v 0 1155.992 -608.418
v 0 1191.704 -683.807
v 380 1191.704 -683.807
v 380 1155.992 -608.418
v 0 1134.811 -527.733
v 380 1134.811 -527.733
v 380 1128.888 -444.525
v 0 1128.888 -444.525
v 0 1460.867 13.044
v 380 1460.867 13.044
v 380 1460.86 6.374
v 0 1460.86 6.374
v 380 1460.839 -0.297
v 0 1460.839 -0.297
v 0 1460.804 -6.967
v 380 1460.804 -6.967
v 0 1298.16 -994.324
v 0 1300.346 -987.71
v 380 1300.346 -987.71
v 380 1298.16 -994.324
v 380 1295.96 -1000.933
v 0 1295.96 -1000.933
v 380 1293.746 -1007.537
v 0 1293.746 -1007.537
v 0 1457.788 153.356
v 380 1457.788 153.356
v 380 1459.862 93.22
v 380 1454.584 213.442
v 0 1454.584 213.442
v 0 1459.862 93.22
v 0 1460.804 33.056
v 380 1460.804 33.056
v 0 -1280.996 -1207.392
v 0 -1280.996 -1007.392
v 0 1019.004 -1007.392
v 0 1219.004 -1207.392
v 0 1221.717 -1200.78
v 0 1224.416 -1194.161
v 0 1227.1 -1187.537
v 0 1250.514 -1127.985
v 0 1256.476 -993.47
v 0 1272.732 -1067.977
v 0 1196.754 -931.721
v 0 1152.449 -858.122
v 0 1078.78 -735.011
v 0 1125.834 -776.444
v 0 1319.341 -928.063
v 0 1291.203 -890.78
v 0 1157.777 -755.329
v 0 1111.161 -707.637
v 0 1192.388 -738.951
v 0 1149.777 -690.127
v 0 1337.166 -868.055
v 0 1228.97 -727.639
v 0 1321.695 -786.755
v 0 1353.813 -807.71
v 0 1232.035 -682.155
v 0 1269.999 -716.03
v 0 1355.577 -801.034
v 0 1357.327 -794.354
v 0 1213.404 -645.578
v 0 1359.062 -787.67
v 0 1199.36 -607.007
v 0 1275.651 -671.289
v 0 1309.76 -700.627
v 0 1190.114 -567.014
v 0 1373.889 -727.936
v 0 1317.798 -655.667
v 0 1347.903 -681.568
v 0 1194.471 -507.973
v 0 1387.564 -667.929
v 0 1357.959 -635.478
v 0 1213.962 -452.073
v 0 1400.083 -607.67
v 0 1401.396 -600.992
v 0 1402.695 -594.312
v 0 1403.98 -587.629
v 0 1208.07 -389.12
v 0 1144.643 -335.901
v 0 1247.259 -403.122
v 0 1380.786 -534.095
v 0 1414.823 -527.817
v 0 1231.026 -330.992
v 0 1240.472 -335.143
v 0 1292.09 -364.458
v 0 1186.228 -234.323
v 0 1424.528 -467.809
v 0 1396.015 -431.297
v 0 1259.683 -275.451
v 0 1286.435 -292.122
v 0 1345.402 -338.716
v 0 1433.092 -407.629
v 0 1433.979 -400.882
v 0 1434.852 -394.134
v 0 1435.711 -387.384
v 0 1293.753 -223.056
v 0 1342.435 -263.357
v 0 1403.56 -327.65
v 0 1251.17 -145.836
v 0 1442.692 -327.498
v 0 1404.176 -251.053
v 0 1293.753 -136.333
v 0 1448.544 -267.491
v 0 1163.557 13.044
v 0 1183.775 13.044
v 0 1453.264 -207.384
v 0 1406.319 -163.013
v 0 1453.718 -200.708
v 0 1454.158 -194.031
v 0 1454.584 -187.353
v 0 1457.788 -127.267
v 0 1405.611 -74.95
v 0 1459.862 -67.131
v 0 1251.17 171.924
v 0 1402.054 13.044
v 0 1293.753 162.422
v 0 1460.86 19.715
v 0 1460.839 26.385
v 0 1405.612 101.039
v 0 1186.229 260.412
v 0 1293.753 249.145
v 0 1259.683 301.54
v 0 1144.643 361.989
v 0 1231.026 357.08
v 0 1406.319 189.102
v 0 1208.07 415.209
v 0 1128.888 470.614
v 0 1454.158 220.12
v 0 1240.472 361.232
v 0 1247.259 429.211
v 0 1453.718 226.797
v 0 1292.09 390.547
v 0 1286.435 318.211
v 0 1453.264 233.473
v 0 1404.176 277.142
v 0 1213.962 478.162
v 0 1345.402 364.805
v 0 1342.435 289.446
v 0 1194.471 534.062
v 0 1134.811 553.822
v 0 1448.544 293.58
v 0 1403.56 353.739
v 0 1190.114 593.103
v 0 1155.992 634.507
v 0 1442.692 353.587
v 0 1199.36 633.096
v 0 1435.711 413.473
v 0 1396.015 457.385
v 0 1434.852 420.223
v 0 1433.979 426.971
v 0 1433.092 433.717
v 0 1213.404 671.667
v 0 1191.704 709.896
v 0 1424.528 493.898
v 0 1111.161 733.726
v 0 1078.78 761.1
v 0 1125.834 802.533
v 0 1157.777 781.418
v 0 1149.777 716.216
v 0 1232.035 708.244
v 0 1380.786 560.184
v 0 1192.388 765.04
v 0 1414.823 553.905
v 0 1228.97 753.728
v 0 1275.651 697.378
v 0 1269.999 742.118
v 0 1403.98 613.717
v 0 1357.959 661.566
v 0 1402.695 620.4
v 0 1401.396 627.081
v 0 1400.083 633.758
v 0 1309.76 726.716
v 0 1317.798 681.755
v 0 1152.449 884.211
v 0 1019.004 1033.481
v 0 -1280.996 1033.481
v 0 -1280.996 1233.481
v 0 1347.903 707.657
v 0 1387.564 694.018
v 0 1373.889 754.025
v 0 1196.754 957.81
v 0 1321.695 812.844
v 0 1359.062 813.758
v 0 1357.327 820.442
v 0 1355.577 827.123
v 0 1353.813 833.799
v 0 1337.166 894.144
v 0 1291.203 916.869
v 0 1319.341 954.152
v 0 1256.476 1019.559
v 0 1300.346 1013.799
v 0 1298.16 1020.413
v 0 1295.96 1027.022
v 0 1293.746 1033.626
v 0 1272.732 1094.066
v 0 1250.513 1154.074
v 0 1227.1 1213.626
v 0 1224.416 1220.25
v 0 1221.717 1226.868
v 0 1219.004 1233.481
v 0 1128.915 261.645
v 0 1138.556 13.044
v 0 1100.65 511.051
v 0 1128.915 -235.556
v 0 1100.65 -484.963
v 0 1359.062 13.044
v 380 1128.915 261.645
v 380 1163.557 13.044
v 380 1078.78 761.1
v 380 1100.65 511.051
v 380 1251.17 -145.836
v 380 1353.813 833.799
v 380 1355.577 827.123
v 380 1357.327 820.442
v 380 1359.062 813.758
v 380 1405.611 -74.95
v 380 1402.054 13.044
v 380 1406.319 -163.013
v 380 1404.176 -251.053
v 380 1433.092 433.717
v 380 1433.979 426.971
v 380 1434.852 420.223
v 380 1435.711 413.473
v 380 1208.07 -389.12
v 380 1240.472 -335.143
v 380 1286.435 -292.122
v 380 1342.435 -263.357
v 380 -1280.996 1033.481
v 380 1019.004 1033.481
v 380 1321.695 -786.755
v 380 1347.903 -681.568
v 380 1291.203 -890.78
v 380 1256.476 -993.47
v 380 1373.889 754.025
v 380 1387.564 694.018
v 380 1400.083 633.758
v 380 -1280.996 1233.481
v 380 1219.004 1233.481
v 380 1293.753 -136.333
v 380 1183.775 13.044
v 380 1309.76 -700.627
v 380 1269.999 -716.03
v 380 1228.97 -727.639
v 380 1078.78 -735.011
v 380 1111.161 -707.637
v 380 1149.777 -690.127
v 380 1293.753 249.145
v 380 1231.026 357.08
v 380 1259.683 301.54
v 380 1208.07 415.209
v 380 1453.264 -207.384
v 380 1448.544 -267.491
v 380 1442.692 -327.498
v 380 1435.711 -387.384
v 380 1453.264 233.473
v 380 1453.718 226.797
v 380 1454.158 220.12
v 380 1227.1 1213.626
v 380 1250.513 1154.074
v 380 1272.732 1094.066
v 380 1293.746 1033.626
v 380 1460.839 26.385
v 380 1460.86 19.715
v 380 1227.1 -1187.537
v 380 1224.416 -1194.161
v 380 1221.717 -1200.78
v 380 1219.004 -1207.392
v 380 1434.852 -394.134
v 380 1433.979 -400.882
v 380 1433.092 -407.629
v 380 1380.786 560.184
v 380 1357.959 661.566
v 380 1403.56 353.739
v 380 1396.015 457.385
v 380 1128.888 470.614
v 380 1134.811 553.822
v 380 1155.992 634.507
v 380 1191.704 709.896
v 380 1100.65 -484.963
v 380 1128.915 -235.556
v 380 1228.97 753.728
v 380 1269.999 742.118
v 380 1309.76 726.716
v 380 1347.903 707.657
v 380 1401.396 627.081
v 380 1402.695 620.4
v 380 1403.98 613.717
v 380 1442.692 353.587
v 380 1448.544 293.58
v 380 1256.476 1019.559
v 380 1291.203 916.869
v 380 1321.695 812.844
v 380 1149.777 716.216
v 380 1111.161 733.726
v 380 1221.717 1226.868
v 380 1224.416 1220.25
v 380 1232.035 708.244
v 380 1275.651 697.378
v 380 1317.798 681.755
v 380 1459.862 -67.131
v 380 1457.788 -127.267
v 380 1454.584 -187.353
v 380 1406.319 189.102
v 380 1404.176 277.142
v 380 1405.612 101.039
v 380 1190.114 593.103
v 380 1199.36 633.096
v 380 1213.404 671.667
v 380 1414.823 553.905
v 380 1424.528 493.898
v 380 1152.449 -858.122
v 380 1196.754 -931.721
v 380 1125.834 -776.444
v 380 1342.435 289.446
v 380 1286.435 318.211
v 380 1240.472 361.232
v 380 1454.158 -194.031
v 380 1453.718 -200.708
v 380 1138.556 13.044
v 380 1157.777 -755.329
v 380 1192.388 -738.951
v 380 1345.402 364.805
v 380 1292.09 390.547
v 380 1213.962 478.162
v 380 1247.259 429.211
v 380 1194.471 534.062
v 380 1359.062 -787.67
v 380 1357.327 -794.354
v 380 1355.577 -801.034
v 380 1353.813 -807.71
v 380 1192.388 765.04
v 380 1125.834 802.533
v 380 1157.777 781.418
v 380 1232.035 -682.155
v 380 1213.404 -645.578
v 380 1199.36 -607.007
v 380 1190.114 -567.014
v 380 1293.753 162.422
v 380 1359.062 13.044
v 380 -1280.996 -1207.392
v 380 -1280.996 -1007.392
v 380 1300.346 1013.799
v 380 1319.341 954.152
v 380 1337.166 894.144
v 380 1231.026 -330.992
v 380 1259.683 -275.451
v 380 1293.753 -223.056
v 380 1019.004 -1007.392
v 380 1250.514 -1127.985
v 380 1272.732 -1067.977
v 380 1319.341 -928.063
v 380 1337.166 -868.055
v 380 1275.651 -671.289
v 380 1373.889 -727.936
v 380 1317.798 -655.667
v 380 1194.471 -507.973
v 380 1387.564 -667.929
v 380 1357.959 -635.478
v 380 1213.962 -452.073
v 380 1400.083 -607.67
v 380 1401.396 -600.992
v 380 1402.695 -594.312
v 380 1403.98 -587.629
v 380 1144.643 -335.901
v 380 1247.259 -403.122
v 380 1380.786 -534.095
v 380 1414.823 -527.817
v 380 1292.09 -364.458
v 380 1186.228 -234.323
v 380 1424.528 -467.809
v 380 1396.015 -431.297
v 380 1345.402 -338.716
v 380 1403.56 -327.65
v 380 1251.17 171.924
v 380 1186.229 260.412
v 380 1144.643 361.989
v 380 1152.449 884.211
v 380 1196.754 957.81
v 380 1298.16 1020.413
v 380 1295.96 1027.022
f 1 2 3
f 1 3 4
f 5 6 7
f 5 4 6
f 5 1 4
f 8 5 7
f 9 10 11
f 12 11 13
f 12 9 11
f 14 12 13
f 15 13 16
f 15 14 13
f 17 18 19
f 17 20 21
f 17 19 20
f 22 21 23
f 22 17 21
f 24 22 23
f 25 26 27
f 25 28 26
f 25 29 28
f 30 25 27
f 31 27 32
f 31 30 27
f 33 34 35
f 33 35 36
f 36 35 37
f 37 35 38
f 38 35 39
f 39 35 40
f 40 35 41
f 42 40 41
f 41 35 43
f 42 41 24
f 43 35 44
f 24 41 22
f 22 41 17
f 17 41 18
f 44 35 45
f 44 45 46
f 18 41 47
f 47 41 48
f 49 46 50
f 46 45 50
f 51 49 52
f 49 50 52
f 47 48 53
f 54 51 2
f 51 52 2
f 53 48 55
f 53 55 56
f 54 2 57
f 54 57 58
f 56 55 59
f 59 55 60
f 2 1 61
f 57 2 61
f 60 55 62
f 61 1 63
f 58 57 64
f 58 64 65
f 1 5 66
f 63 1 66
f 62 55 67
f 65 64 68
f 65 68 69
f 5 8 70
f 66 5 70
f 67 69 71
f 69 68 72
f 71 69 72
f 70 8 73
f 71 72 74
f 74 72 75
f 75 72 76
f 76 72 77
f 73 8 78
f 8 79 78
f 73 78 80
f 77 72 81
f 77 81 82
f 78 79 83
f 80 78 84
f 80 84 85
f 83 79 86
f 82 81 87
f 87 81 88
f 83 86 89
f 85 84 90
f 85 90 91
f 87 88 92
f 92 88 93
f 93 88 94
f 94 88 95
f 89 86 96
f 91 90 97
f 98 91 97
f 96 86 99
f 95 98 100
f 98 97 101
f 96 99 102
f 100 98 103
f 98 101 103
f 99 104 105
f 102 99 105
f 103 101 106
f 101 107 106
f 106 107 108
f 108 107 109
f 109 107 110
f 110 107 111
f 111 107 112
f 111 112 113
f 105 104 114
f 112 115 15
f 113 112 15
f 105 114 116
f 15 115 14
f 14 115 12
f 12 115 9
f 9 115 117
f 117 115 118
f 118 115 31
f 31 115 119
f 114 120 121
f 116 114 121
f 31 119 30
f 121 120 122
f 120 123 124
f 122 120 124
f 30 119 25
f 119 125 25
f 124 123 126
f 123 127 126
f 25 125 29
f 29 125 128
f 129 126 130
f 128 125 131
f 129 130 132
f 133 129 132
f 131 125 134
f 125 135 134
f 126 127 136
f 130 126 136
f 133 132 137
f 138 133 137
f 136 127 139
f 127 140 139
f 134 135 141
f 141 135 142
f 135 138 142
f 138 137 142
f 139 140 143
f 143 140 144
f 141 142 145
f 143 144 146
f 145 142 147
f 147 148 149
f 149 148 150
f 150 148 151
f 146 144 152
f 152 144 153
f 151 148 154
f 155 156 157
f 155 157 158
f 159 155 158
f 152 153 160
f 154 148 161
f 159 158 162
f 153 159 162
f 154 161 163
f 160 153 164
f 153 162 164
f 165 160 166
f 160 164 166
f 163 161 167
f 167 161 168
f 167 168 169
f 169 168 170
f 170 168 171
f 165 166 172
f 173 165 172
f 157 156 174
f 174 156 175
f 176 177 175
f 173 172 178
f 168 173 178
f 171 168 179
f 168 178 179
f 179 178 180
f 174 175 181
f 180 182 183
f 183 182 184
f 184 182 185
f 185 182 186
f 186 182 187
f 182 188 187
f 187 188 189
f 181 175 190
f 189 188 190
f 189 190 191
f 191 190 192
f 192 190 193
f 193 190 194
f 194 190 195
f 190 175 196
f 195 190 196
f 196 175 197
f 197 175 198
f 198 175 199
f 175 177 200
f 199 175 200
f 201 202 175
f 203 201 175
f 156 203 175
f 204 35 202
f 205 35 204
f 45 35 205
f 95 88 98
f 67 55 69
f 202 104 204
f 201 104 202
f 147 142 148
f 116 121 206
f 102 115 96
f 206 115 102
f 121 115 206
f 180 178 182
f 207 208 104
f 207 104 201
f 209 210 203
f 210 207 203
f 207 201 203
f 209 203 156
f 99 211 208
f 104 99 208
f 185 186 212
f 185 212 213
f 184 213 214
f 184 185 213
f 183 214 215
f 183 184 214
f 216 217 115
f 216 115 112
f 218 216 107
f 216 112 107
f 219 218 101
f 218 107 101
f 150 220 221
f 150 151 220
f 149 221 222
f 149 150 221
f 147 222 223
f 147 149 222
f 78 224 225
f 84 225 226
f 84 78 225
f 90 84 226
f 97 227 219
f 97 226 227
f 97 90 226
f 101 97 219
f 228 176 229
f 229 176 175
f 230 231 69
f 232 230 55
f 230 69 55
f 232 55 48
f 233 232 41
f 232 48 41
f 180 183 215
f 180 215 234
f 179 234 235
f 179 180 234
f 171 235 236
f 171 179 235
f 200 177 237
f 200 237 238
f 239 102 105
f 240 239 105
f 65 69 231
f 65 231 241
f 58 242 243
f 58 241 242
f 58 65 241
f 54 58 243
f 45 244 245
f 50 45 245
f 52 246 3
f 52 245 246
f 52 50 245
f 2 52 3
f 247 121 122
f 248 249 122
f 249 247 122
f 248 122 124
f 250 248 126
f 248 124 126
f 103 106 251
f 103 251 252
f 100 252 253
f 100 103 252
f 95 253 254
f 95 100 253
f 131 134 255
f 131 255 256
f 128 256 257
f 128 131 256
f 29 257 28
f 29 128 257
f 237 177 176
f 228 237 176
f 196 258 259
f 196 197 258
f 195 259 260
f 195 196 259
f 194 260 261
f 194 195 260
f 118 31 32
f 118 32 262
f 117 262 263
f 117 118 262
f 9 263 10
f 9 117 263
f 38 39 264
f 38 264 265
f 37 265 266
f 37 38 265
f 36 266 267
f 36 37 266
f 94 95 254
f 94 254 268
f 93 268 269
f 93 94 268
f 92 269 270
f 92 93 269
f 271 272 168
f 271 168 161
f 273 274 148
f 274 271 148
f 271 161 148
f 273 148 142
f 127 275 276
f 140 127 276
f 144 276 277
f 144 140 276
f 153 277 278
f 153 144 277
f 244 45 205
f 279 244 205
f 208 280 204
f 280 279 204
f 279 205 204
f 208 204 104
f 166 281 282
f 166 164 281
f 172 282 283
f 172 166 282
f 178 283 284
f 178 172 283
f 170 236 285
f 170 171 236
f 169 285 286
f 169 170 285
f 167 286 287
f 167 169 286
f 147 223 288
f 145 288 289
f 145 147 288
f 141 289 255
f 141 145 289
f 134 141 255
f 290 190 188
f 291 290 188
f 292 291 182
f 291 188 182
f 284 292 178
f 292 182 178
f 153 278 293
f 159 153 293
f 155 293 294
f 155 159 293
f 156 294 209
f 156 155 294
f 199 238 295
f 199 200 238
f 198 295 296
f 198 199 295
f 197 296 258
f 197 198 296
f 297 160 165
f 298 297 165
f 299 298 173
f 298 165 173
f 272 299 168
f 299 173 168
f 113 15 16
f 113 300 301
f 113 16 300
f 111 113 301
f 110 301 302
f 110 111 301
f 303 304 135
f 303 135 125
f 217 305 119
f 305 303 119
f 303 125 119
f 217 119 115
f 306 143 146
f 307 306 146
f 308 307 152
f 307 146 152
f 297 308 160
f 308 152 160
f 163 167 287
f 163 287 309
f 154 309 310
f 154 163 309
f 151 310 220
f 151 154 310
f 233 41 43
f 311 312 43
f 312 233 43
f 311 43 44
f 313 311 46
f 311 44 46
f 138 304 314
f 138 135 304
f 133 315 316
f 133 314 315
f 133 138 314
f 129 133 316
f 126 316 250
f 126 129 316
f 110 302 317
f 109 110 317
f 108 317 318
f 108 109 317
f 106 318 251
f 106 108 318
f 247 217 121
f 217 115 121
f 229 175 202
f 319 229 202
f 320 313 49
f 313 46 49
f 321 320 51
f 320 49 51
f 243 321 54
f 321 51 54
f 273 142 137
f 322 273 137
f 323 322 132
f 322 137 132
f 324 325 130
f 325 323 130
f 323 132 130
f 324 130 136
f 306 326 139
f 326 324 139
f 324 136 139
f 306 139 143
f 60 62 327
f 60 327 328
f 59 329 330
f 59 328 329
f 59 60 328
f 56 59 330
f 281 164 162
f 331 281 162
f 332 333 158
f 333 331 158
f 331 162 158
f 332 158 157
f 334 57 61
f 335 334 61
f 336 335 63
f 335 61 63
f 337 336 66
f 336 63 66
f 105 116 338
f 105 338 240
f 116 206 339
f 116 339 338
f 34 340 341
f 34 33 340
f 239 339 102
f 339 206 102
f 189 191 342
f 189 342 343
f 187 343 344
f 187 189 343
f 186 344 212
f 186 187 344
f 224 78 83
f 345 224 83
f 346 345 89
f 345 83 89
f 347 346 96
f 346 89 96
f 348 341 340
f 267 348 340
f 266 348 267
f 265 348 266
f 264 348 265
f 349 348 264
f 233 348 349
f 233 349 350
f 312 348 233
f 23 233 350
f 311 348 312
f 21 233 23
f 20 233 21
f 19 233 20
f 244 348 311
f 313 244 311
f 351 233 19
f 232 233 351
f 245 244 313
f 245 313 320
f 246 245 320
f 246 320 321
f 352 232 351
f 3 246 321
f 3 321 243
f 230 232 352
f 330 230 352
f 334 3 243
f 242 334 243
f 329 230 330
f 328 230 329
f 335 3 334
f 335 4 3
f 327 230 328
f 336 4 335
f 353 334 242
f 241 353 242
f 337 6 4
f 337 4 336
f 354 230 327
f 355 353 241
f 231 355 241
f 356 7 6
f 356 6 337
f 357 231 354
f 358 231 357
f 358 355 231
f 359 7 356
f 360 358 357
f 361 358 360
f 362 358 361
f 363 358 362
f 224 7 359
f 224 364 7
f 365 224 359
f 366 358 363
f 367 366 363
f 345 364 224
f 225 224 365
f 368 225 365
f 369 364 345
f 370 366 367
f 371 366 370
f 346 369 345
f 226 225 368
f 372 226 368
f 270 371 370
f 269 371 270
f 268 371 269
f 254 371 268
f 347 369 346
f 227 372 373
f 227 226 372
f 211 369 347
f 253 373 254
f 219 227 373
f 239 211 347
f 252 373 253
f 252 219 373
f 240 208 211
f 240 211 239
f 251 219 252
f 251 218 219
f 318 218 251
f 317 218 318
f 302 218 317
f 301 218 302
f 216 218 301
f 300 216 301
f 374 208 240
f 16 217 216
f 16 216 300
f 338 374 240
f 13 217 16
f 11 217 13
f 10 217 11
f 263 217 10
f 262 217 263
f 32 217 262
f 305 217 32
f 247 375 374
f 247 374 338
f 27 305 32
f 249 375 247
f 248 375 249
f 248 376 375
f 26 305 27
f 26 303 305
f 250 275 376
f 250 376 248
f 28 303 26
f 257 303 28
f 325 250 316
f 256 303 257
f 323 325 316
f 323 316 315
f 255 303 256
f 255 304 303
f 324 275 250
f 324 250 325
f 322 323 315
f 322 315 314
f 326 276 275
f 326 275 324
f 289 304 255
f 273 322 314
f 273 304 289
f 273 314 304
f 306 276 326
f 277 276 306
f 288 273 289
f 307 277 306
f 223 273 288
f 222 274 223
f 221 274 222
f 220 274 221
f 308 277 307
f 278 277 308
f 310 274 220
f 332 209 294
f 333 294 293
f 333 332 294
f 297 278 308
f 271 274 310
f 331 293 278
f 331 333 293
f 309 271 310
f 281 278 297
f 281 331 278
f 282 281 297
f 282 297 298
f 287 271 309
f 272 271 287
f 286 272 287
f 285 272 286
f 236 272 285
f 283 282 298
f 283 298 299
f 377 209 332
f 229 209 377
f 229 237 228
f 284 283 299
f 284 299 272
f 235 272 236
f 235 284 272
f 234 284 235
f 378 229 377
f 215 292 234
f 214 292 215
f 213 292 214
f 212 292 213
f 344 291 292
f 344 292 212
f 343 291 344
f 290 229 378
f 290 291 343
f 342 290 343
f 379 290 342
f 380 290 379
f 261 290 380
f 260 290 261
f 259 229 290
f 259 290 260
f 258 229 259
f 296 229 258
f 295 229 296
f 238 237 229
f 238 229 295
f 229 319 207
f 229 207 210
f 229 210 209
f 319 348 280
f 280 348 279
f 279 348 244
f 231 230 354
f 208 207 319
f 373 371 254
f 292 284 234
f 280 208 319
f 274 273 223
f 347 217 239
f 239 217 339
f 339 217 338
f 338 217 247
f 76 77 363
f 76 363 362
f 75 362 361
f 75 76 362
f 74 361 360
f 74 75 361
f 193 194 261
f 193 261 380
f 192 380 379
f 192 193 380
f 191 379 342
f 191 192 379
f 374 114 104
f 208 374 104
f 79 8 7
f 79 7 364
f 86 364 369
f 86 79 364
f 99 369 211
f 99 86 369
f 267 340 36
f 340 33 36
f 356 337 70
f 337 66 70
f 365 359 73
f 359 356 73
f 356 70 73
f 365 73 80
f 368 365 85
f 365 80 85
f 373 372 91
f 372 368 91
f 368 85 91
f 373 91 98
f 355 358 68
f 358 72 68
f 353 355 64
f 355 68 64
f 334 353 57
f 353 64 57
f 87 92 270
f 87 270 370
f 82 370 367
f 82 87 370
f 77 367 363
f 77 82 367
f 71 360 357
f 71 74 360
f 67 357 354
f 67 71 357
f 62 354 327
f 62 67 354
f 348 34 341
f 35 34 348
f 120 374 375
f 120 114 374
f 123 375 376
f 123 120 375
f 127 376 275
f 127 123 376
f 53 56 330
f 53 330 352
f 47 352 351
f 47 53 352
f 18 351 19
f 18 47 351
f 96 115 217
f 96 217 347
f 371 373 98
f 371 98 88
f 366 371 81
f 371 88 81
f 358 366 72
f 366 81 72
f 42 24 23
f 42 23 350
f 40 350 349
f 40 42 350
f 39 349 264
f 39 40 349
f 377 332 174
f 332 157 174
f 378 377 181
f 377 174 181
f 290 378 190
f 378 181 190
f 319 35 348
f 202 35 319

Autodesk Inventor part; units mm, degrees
ref_plane "YZ Plane" through (0, 0, 0) normal (1, 0, 0) x (0, 1, 0)
ref_plane "XZ Plane" through (0, 0, 0) normal (0, 1, 0) x (-1, 0, 0)
ref_plane "XY Plane" through (0, 0, 0) normal (0, 0, 1) x (1, 0, 0)
sketch "Sketch1" plane through (0, 0, 0) normal (1, 0, 0) x (0, 1, 0)
  arc A0 (1227.0996, 1213.6257) -> (1219.0039, 1233.4807) centre (-1740.0857, 15.3721) ccw
  arc A1 (1293.746, 1033.6257) -> (1227.0996, 1213.6257) centre (-1739.133, 13.0159) ccw
  arc A2 (1300.346, 1013.7992) -> (1293.746, 1033.6257) centre (-1739.133, 13.0159) ccw
  arc A3 (1353.8129, 833.7992) -> (1300.346, 1013.7992) centre (-1739.133, 13.0159) ccw
  arc A4 (1359.0618, 813.7583) -> (1353.8129, 833.7992) centre (-1739.133, 13.0159) ccw
  arc A5 (1400.0832, 633.7583) -> (1359.0618, 813.7583) centre (-1739.133, 13.0159) ccw
  arc A6 (1403.9797, 613.7174) -> (1400.0832, 633.7583) centre (-1739.133, 13.0159) ccw
  arc A7 (1433.0918, 433.7174) -> (1403.9797, 613.7174) centre (-1739.133, 13.0159) ccw
  arc A8 (1453.264, 233.4731) -> (1435.7109, 413.4731) centre (-1739.133, 13.0159) ccw
  arc A9 (1435.7109, 413.4731) -> (1433.0918, 433.7174) centre (-1739.133, 13.0159) ccw
  arc A10 (1454.5841, 213.442) -> (1453.264, 233.4731) centre (-1739.133, 13.0159) ccw
  arc A11 (1460.8042, 33.0557) -> (1454.5841, 213.442) centre (-1739.133, 13.0159) ccw
  arc A12 (1460.867, 13.0444) -> (1460.8042, 33.0557) centre (-1739.133, 13.0159) ccw
  line L0 (-1280.9961, 1233.4807) -> (1219.0039, 1233.4807)
  line L1 (-1280.9961, 1233.4807) -> (-1280.9961, 1033.4807)
  line L2 (-1280.9961, 1033.4807) -> (1019.0039, 1033.4807)
  line L3 (1019.0039, 1033.4807) -> (1138.5556, 13.0444)
  line L4 (1460.867, 13.0444) -> (1469.3401, 13.0444)
  line L5 (1402.0541, 13.0444) -> (1293.7527, 249.1451)
  line L6 (1293.7527, 249.1451) -> (1163.5573, 13.0444)
  arc A13 (1208.0697, 415.2091) -> (1293.7527, 249.1451) centre (1799.1105, 615.028) ccw
  arc A14 (1232.0349, 708.2436) -> (1190.1135, 593.1028) centre (1522.2816, 537.3662) ccw
  arc A15 (1128.8881, 470.6135) -> (1251.1701, 171.9244) centre (1578.7407, 480.4058) ccw
  arc A16 (1191.7037, 709.8957) -> (1128.8881, 470.6135) centre (1578.7407, 480.4058) ccw
  arc A17 (1042.3948, 833.8278) -> (1191.7037, 709.8957) centre (1193.4877, 863.9522) ccw
  arc A18 (1400.0832, 633.7583) -> (1232.0349, 708.2436) centre (1155.9138, 309.6924) ccw
  arc A19 (1390.4476, 680.6424) -> (1228.9697, 753.7281) centre (1125.8269, 310.9107) ccw
  arc A20 (1190.1135, 593.1028) -> (1442.5544, 354.8708) centre (1416.5041, 580.1314) ccw
  arc A21 (1208.0697, 415.2091) -> (1449.7856, 279.0945) centre (1417.3067, 504.0976) ccw
  arc A22 (1290.1375, 1044.287) -> (1125.8335, 802.5328) centre (1497.6402, 726.5511) ccw
  arc A23 (1260.8526, 1126.6075) -> (1078.7798, 848.8845) centre (1573.2668, 723.2474) ccw
  arc A24 (1028.8129, 949.7563) -> (1078.7798, 848.8845) centre (1290.1521, 1016.3994) ccw
  arc A25 (1125.8335, 802.5328) -> (1228.9697, 753.7281) centre (1290.1521, 1016.3994) ccw
  line L7 (1359.0618, 13.0444) -> (1293.7527, 162.4218)
  line L8 (1293.7527, 162.4218) -> (1183.7754, 13.0444)
  line L9 (1460.867, 13.0444) -> (1635.1821, 13.0444)
  arc A26 (1219.0039, -1207.3919) -> (1227.0996, -1187.5369) centre (-1740.0857, 10.7167) ccw
  arc A27 (1227.0996, -1187.5369) -> (1293.746, -1007.5369) centre (-1739.133, 13.073) ccw
  arc A28 (1293.746, -1007.5369) -> (1300.346, -987.7104) centre (-1739.133, 13.073) ccw
  arc A29 (1300.346, -987.7104) -> (1353.8129, -807.7104) centre (-1739.133, 13.073) ccw
  arc A30 (1353.8129, -807.7104) -> (1359.0618, -787.6695) centre (-1739.133, 13.073) ccw
  arc A31 (1359.0618, -787.6695) -> (1400.0832, -607.6695) centre (-1739.133, 13.073) ccw
  arc A32 (1400.0832, -607.6695) -> (1403.9797, -587.6286) centre (-1739.133, 13.073) ccw
  arc A33 (1403.9797, -587.6286) -> (1433.0918, -407.6286) centre (-1739.133, 13.073) ccw
  arc A34 (1435.7109, -387.3843) -> (1453.264, -207.3843) centre (-1739.133, 13.073) ccw
  arc A35 (1433.0918, -407.6286) -> (1435.7109, -387.3843) centre (-1739.133, 13.073) ccw
  arc A36 (1453.264, -207.3843) -> (1454.5841, -187.3532) centre (-1739.133, 13.073) ccw
  arc A37 (1454.5841, -187.3532) -> (1460.8042, -6.9669) centre (-1739.133, 13.073) ccw
  arc A38 (1460.8042, -6.9669) -> (1460.867, 13.0444) centre (-1739.133, 13.073) ccw
  line L10 (-1280.9961, -1207.3919) -> (1219.0039, -1207.3919)
  line L11 (-1280.9961, -1207.3919) -> (-1280.9961, -1007.3919)
  line L12 (-1280.9961, -1007.3919) -> (1019.0039, -1007.3919)
  line L13 (1019.0039, -1007.3919) -> (1138.5556, 13.0444)
  line L14 (1402.0541, 13.0444) -> (1293.7527, -223.0563)
  line L15 (1293.7527, -223.0563) -> (1163.5573, 13.0444)
  arc A39 (1293.7527, -223.0563) -> (1208.0697, -389.1203) centre (1799.1105, -588.9392) ccw
  arc A40 (1190.1135, -567.014) -> (1232.0349, -682.1547) centre (1522.2816, -511.2774) ccw
  arc A41 (1251.1701, -145.8356) -> (1128.8881, -444.5247) centre (1578.7407, -454.317) ccw
  arc A42 (1128.8881, -444.5247) -> (1191.7037, -683.8069) centre (1578.7407, -454.317) ccw
  arc A43 (1191.7037, -683.8069) -> (1042.3948, -807.7389) centre (1193.4877, -837.8633) ccw
  arc A44 (1232.0349, -682.1547) -> (1400.0832, -607.6695) centre (1155.9138, -283.6036) ccw
  arc A45 (1228.9697, -727.6392) -> (1390.4476, -654.5536) centre (1125.8269, -284.8219) ccw
  arc A46 (1442.5544, -328.782) -> (1190.1135, -567.014) centre (1416.5041, -554.0426) ccw
  arc A47 (1449.7856, -253.0056) -> (1208.0697, -389.1203) centre (1417.3067, -478.0088) ccw
  arc A48 (1125.8335, -776.444) -> (1290.1375, -1018.1981) centre (1497.6402, -700.4623) ccw
  arc A49 (1078.7798, -822.7957) -> (1260.8526, -1100.5187) centre (1573.2668, -697.1585) ccw
  arc A50 (1078.7798, -822.7957) -> (1028.8129, -923.6674) centre (1290.1521, -990.3106) ccw
  arc A51 (1228.9697, -727.6392) -> (1125.8335, -776.444) centre (1290.1521, -990.3106) ccw
  line L16 (1359.0618, 13.0444) -> (1293.7527, -136.333)
  line L17 (1293.7527, -136.333) -> (1183.7754, 13.0444)
  arc A52 (1078.7798, 761.0996) -> (1163.5573, 13.0444) centre (10853.7042, 1490.0655) ccw
  arc A53 (1347.9034, 707.6571) -> (1256.4763, 1019.5586) centre (-1233.1421, 120.4308) ccw
  arc A54 (1403.56, 353.7392) -> (1357.9586, 661.5664) centre (7.3802, 304.2011) ccw
  arc A55 (1402.0541, 13.0444) -> (1404.1764, 277.1419) centre (-1314.3487, 166.9313) ccw
  arc A56 (1163.5573, 13.0444) -> (1078.7798, -735.0108) centre (10853.7042, -1463.9767) ccw
  arc A57 (1256.4763, -993.4698) -> (1347.9034, -681.5682) centre (-1233.1421, -94.3419) ccw
  arc A58 (1357.9586, -635.4776) -> (1403.56, -327.6504) centre (7.3802, -278.1123) ccw
  arc A59 (1404.1764, -251.0531) -> (1402.0541, 13.0444) centre (-1314.3487, -140.8425) ccw
  point P0 (0, 0)
  point P1 (1183.7754, 13.0444)
  point P2 (1359.0618, 13.0444)
  point P3 (1402.0541, 13.0444)
  point P4 (1163.5573, 13.0444)
  point P5 (1078.7798, -735.0108)
  point P6 (1163.5573, 13.0444)
  point P7 (1138.5556, 13.0444)
  point P8 (1347.9034, -681.5682)
  point P9 (1256.4763, -993.4698)
  point P10 (1403.56, -327.6504)
  point P11 (1402.0541, 13.0444)
  point P12 (1404.1764, -251.0531)
  dimension "d0" = 200
  dimension "d1" = 2300
extrude "Extrusion1" add sketch "Sketch1" along normal blind 380 contours A1 A23 A24 L3 L2 L1 L0 A0 | A1 A22 A25 A19 A5 A18 A14 A20 A8 A21 A13 L6 A15 A16 A17 L3 A24 A23 | A1 A2 A3 A4 A5 A19 A53 A22 | A17 A52 A56 A43 L13 L3 | A6 A7 A9 A8 A20 A54 A18 | A43 A42 A41 L15 A39 A47 A34 A46 A40 A44 A31 A45 A51 A48 A27 A49 A50 L13 | L6 L5 L14 L15 | A50 A49 A27 A26 L10 L11 L12 L13 | A55 A21 A8 A10 A11 A12 A38 A37 A36 A34 A47 A59 | A48 A57 A45 A31 A30 A29 A28 A27 | A34 A35 A33 A32 A44 A58 A46
properties part number "side_door_frame" material "Wood (Maple)"
